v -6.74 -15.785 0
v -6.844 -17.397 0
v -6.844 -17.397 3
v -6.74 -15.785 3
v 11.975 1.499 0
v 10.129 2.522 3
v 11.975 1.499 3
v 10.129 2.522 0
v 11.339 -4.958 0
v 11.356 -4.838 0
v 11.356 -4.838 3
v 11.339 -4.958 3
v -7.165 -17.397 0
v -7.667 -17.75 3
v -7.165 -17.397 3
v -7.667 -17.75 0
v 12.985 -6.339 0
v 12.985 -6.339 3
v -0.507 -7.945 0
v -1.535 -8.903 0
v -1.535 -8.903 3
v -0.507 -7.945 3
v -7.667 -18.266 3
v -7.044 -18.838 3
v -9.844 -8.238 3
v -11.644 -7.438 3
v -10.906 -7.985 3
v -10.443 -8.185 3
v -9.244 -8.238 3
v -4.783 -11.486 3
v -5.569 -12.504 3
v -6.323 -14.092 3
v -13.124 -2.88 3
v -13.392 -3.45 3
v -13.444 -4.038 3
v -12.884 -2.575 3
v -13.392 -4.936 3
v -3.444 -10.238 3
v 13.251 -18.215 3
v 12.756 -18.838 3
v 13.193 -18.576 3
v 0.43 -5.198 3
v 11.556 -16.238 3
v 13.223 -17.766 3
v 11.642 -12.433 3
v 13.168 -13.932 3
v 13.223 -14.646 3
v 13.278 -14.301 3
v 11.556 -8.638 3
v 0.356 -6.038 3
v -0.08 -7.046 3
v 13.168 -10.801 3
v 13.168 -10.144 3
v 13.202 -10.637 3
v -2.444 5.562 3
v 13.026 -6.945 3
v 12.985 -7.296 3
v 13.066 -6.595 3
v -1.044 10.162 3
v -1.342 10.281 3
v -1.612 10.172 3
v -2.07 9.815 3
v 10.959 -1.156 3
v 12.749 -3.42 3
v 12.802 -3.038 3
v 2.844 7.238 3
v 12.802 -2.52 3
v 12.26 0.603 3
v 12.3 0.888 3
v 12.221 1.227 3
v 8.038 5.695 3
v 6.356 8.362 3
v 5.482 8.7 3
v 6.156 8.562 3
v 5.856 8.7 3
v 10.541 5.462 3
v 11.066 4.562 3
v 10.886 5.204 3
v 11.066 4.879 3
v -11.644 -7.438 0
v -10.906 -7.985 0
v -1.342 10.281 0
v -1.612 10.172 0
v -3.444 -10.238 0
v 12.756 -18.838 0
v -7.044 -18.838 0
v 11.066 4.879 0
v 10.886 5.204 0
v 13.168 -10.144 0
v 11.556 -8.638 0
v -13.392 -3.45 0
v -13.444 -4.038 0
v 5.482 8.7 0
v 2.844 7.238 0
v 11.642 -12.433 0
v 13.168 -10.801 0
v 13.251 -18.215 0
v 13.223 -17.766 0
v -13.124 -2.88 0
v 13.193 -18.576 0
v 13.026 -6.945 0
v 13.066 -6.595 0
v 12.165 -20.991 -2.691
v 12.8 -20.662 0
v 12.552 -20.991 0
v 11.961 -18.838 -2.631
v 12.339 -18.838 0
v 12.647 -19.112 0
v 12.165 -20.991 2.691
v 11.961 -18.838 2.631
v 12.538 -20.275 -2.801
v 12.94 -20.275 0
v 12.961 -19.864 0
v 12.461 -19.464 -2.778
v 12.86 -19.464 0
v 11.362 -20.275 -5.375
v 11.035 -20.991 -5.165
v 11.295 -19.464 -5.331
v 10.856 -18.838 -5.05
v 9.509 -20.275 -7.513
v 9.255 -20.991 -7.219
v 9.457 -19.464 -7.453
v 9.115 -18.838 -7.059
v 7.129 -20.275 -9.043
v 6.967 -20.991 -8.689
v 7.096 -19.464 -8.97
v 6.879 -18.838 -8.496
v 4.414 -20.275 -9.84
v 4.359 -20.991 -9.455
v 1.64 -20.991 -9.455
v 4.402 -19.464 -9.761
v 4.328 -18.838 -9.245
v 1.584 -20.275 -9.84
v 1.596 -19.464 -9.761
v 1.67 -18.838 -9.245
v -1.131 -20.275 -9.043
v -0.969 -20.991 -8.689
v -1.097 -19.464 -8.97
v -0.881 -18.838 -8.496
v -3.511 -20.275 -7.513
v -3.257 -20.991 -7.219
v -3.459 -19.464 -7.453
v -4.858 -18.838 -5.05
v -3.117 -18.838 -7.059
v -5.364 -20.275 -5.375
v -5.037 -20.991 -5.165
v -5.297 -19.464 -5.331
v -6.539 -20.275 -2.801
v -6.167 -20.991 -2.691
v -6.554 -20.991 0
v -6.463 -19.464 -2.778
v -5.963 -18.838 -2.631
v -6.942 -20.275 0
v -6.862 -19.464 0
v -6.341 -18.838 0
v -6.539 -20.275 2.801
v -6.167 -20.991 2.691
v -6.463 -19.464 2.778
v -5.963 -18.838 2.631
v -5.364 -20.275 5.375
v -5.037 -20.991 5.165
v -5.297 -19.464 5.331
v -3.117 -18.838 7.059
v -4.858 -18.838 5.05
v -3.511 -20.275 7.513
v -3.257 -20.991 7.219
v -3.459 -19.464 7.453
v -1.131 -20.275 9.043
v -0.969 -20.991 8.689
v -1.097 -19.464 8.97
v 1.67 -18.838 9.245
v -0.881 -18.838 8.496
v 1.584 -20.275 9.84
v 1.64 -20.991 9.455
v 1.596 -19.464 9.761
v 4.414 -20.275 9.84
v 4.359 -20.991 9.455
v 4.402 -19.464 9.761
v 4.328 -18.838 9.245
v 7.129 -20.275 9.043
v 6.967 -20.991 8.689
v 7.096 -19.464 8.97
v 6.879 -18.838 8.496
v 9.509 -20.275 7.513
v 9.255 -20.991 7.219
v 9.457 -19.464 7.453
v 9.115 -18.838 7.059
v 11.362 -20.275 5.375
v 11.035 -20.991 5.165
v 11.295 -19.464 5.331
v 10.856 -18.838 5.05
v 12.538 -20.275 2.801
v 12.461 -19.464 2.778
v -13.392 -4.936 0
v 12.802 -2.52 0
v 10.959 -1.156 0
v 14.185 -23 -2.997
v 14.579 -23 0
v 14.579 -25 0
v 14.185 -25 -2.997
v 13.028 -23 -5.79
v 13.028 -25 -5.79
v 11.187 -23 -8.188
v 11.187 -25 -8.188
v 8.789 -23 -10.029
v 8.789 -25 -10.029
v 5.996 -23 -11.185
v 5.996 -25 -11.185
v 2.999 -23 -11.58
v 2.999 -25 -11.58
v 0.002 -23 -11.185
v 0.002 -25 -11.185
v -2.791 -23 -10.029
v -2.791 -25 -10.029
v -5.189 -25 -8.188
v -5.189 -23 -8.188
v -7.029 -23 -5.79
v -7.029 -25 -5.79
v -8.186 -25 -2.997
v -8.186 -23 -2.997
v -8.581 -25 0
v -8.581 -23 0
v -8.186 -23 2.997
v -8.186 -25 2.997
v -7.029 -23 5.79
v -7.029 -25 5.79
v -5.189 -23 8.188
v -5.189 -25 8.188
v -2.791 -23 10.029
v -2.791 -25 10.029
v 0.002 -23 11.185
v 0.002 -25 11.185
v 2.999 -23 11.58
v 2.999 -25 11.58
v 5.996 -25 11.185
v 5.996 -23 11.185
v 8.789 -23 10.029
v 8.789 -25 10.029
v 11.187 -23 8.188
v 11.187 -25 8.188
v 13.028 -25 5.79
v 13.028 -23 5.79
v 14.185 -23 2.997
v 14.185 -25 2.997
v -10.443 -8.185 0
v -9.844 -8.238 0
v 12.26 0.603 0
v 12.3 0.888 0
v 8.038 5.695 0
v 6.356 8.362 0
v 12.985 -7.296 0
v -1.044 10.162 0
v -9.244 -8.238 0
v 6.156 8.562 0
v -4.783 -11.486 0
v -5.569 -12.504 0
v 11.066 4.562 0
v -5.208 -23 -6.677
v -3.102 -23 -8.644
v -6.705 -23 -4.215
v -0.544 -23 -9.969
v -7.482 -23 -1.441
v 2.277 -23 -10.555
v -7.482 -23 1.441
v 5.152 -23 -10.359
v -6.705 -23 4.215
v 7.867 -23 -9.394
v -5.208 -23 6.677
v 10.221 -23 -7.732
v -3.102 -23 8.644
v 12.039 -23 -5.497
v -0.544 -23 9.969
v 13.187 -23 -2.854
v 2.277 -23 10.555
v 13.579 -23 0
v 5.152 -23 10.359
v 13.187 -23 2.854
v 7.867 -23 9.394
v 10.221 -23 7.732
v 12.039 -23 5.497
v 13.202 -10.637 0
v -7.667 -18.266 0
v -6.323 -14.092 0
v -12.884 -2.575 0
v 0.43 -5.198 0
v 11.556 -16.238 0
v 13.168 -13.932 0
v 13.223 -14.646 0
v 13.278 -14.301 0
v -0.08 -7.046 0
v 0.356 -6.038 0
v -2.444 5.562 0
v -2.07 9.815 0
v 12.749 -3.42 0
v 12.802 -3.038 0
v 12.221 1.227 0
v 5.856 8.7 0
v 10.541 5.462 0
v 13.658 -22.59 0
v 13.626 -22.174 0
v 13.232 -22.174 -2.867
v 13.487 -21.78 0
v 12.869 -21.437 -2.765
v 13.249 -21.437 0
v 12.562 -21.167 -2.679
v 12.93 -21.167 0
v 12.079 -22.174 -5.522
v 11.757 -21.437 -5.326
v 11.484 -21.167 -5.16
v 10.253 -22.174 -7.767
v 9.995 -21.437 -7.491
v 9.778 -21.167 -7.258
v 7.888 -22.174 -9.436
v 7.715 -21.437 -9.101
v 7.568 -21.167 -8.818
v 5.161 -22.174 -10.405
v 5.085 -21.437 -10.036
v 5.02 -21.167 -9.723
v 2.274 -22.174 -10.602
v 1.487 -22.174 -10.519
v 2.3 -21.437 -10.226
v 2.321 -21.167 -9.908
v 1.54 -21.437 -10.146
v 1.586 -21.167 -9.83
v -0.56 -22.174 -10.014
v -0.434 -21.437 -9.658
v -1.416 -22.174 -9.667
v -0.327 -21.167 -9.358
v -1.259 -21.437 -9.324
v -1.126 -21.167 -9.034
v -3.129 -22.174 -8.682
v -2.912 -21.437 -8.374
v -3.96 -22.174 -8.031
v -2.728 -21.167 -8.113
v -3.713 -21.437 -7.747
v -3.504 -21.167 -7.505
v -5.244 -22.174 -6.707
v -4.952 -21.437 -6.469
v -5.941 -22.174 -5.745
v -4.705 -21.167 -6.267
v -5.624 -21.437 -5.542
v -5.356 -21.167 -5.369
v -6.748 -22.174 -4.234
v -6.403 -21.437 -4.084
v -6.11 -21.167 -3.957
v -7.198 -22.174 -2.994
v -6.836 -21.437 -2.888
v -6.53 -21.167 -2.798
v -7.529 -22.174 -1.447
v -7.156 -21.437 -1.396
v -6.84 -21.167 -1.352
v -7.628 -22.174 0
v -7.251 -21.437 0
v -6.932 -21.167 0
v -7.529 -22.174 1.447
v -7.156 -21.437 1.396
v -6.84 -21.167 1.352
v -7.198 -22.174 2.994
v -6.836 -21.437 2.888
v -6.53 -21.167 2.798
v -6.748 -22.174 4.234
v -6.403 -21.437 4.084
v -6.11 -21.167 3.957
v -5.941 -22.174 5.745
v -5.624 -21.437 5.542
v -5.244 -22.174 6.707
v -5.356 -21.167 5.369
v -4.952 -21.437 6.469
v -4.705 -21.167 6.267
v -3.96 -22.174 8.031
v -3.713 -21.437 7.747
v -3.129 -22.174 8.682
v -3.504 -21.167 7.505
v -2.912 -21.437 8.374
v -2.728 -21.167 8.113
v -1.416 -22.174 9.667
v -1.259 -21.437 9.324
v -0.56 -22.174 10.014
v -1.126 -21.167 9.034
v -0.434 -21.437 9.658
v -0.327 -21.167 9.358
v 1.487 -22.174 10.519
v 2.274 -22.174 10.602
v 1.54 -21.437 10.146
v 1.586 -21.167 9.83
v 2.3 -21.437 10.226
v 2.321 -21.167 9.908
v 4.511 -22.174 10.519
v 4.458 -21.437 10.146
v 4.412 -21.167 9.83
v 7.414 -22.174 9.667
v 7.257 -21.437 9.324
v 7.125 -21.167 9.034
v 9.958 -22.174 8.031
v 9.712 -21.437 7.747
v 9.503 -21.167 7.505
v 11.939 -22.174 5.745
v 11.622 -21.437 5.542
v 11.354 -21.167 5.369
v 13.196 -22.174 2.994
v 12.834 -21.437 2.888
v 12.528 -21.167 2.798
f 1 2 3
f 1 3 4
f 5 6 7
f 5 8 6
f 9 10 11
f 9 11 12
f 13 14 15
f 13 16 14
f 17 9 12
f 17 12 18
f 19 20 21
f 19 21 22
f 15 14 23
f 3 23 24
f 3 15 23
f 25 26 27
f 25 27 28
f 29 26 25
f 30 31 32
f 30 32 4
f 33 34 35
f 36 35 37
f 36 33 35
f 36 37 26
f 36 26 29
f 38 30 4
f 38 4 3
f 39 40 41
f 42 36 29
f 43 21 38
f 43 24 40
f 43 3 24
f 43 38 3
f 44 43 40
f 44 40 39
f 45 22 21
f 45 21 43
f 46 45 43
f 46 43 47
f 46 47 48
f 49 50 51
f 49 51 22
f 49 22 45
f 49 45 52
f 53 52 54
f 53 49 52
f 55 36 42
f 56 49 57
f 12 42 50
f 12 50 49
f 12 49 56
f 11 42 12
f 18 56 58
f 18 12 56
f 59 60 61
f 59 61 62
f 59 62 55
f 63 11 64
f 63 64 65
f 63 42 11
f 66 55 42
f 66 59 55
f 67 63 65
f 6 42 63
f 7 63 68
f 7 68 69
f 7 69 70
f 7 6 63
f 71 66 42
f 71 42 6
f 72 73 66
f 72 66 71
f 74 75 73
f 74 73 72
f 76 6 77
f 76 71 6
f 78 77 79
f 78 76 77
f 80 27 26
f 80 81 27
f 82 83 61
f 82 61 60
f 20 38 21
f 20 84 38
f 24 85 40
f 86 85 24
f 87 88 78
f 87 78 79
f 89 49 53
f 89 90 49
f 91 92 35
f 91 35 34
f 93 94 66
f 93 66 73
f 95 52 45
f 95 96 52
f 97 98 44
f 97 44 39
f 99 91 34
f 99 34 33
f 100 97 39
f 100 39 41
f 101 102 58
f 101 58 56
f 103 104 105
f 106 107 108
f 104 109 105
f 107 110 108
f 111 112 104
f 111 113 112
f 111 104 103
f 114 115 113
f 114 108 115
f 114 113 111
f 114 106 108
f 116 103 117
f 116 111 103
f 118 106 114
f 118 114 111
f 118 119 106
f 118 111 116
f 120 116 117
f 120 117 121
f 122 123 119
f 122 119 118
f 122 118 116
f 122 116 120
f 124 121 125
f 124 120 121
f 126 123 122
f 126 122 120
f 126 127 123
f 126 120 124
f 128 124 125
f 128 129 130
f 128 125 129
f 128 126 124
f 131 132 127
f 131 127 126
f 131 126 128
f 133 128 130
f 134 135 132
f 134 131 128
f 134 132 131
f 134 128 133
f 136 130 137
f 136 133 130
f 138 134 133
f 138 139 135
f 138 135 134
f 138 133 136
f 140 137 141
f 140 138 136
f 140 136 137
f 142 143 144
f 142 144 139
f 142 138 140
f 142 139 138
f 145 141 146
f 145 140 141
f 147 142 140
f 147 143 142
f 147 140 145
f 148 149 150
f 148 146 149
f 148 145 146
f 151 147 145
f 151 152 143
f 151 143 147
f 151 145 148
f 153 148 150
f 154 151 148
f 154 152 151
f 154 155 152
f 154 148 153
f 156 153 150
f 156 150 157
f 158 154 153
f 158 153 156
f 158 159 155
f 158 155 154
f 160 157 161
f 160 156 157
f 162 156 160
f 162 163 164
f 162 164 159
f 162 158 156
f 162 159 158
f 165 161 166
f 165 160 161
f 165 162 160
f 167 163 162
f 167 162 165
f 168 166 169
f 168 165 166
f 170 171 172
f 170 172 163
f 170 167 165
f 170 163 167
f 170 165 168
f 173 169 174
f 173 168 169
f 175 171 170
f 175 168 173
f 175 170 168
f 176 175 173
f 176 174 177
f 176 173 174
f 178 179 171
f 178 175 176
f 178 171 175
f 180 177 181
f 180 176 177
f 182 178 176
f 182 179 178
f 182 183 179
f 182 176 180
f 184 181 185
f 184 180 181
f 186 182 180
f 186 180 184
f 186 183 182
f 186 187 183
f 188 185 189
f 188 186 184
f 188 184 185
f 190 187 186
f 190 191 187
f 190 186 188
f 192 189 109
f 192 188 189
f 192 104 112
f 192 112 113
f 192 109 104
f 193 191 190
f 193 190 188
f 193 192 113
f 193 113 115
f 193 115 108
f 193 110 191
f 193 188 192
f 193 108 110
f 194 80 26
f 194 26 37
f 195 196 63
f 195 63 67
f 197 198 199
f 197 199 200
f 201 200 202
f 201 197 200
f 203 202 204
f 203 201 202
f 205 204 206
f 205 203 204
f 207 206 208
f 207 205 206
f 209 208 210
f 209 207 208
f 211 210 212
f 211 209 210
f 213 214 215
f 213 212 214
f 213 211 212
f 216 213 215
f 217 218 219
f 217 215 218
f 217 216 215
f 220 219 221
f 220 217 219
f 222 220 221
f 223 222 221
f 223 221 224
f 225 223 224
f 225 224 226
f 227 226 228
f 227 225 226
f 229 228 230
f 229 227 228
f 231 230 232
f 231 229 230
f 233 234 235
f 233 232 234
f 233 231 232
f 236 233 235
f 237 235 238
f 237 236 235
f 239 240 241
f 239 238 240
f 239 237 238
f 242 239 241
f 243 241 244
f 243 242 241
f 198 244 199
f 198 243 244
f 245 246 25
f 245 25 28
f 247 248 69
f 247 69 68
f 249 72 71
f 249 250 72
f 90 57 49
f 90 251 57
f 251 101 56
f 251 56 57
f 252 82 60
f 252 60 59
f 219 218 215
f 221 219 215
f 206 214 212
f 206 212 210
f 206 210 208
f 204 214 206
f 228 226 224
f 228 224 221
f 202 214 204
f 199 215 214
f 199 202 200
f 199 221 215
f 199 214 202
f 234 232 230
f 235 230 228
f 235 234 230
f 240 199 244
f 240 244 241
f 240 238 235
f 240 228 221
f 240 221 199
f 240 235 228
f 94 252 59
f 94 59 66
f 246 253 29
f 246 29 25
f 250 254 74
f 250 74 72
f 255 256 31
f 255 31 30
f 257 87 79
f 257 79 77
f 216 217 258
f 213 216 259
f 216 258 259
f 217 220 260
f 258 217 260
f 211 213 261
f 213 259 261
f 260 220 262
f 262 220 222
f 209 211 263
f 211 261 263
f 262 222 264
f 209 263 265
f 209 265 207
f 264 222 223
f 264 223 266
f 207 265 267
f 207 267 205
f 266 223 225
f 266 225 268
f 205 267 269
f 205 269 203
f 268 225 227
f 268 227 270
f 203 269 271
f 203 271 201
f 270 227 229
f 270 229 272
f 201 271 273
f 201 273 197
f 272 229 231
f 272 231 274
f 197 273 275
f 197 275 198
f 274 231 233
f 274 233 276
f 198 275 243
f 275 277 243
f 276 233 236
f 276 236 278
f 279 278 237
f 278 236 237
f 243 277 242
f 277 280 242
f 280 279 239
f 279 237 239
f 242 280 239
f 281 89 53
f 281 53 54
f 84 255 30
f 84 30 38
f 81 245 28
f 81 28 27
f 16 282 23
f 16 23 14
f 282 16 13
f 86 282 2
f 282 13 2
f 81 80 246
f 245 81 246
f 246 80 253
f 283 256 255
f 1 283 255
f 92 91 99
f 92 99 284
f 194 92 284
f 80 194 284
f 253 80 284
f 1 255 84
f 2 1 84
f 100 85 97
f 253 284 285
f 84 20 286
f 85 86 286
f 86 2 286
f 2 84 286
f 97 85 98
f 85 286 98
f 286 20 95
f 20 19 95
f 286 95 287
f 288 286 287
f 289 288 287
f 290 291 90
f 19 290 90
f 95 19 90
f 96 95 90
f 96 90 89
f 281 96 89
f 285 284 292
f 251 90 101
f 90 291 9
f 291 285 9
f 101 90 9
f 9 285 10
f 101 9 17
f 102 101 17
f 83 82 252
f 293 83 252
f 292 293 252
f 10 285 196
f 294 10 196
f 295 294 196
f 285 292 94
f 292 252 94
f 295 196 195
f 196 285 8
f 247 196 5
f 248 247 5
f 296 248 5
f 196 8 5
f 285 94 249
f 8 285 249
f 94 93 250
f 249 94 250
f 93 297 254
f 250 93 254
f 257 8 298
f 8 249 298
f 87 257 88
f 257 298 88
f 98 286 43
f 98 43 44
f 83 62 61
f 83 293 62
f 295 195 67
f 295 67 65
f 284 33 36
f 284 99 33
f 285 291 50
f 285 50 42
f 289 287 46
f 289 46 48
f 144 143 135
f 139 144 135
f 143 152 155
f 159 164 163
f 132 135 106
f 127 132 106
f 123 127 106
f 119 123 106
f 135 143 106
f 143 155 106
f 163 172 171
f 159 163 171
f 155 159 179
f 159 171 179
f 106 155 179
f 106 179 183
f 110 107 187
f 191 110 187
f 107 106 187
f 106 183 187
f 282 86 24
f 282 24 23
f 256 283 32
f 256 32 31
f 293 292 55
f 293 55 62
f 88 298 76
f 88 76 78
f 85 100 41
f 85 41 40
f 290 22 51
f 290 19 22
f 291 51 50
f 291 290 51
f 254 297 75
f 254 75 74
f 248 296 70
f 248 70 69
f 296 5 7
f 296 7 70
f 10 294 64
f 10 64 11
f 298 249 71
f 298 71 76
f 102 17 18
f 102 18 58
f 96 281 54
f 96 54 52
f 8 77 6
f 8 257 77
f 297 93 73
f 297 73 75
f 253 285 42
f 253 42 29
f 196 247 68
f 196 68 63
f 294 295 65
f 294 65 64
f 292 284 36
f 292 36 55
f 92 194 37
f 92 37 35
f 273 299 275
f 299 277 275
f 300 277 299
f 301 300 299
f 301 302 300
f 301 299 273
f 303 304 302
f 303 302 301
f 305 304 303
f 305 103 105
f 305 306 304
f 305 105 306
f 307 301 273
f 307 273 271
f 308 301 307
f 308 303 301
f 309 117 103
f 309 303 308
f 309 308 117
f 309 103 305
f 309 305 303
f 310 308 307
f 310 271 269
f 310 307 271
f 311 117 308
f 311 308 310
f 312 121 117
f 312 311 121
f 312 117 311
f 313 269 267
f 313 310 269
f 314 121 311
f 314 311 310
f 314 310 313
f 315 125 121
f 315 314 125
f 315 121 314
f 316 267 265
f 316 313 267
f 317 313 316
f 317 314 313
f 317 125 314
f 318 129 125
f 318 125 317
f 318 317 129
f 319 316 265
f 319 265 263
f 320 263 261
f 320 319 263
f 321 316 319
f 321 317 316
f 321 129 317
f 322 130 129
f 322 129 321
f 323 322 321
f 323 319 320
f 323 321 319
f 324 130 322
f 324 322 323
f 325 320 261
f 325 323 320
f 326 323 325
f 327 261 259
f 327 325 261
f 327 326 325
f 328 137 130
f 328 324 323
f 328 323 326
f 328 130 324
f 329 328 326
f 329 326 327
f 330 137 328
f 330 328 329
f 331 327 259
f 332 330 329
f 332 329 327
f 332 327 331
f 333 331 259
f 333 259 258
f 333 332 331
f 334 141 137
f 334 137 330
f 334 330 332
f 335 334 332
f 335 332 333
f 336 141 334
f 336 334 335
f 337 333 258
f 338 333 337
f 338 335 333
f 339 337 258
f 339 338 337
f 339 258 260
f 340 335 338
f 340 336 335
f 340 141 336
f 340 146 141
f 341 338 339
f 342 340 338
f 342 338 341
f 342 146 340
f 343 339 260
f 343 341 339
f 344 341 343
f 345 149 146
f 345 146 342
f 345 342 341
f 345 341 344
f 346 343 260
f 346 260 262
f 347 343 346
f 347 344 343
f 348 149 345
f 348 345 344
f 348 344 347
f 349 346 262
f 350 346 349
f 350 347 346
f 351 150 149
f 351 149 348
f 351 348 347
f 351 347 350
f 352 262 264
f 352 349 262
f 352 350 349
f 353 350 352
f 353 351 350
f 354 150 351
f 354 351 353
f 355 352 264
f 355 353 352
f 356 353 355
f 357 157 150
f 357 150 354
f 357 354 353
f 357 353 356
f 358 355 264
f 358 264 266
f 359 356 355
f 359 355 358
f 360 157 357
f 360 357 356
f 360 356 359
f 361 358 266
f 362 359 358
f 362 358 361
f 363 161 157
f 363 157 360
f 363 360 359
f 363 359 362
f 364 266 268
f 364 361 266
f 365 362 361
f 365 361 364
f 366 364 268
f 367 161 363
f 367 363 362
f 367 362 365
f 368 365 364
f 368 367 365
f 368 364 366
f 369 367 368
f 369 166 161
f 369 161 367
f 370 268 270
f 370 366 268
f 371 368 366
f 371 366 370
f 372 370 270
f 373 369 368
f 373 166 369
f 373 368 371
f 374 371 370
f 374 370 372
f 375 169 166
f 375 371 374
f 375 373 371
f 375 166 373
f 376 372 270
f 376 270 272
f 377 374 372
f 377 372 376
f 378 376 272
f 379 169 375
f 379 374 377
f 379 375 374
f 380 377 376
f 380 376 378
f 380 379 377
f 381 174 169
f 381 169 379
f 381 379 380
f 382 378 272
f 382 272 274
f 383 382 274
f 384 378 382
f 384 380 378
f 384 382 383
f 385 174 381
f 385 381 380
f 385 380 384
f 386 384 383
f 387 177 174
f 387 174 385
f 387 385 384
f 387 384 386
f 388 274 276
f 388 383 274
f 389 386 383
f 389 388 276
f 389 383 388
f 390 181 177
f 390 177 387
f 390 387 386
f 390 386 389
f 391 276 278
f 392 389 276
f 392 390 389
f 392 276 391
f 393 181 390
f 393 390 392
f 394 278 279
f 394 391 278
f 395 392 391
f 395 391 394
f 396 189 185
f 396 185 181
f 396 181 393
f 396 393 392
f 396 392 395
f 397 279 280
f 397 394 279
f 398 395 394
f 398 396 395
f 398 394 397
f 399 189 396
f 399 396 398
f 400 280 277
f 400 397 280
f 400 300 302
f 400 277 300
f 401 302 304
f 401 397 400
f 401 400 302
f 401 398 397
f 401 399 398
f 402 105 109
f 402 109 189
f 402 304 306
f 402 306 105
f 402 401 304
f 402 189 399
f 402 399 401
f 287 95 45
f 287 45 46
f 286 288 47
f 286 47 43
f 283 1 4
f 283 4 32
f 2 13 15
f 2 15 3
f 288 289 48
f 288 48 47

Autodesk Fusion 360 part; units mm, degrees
sketch "Sketch1" plane through (0, 0, 0) normal (0, 0, 1) x (1, 0, 0)
  line L0 (-1.0438, 10.1623) -> (2.8438, 7.2377)
  line L1 (2.8438, 7.2377) -> (5.4822, 8.7)
  line L2 (5.4822, 8.7) -> (5.8562, 8.7)
  line L3 (5.8562, 8.7) -> (6.1562, 8.5623)
  line L4 (6.1562, 8.5623) -> (6.3562, 8.3623)
  line L5 (6.3562, 8.3623) -> (8.0382, 5.6949)
  line L6 (8.0382, 5.6949) -> (10.541, 5.4625)
  line L7 (10.541, 5.4625) -> (10.8862, 5.2036)
  line L8 (10.8862, 5.2036) -> (11.0659, 4.8793)
  line L9 (11.0659, 4.8793) -> (11.0659, 4.5623)
  line L10 (11.0659, 4.5623) -> (10.1293, 2.5216)
  line L11 (10.1293, 2.5216) -> (11.9749, 1.4992)
  line L12 (11.9749, 1.4992) -> (12.2206, 1.227)
  line L13 (12.2206, 1.227) -> (12.3002, 0.8885)
  line L14 (12.3002, 0.8885) -> (12.2604, 0.603)
  line L15 (12.2604, 0.603) -> (10.9592, -1.1563)
  line L16 (10.9592, -1.1563) -> (12.8024, -2.5196)
  line L17 (12.8024, -2.5196) -> (12.8024, -3.0377)
  line L18 (12.8024, -3.0377) -> (12.7491, -3.4196)
  line L19 (12.7491, -3.4196) -> (11.3562, -4.8377)
  line L20 (11.3562, -4.8377) -> (11.3393, -4.9585)
  line L21 (11.3393, -4.9585) -> (12.9854, -6.3391)
  line L22 (12.9854, -6.3391) -> (13.0657, -6.5947)
  line L23 (13.0657, -6.5947) -> (13.0255, -6.9453)
  line L24 (13.0255, -6.9453) -> (12.9854, -7.2958)
  line L25 (12.9854, -7.2958) -> (11.5562, -8.6377)
  line L26 (11.5562, -8.6377) -> (13.1679, -10.1445)
  line L27 (13.1679, -10.1445) -> (13.2021, -10.6371)
  line L28 (13.2021, -10.6371) -> (13.1679, -10.8008)
  line L29 (13.1679, -10.8008) -> (11.6422, -12.4328)
  line L30 (11.6422, -12.4328) -> (13.1679, -13.9315)
  line L31 (13.1679, -13.9315) -> (13.2784, -14.301)
  line L32 (13.2784, -14.301) -> (13.2231, -14.6459)
  line L33 (13.2231, -14.6459) -> (11.5562, -16.2377)
  line L34 (11.5562, -16.2377) -> (13.2231, -17.7658)
  line L35 (13.2231, -17.7658) -> (13.2508, -18.2149)
  line L36 (13.2508, -18.2149) -> (13.1929, -18.576)
  line L37 (13.1929, -18.576) -> (12.7562, -18.8377)
  line L38 (12.7562, -18.8377) -> (-7.0438, -18.8377)
  line L39 (-7.0438, -18.8377) -> (-7.6673, -18.2662)
  line L40 (-7.6673, -18.2662) -> (-7.6673, -17.7497)
  line L41 (-7.6673, -17.7497) -> (-7.1652, -17.3969)
  line L42 (-7.1652, -17.3969) -> (-6.8438, -17.3969)
  line L43 (-6.8438, -17.3969) -> (-6.7402, -15.7848)
  line L44 (-6.7402, -15.7848) -> (-6.3231, -14.0925)
  line L45 (-6.3231, -14.0925) -> (-5.5692, -12.5045)
  line L46 (-5.5692, -12.5045) -> (-4.7832, -11.4859)
  line L47 (-4.7832, -11.4859) -> (-3.4438, -10.2377)
  line L48 (-3.4438, -10.2377) -> (-1.535, -8.9034)
  line L49 (-1.535, -8.9034) -> (-0.5068, -7.9451)
  line L50 (-0.5068, -7.9451) -> (-0.0799, -7.046)
  line L51 (-0.0799, -7.046) -> (0.3562, -6.0377)
  line L52 (0.3562, -6.0377) -> (0.4299, -5.1981)
  line L53 (0.4299, -5.1981) -> (-9.2438, -8.2377)
  line L54 (-9.2438, -8.2377) -> (-9.8438, -8.2377)
  line L55 (-9.8438, -8.2377) -> (-10.4427, -8.1851)
  line L56 (-10.4427, -8.1851) -> (-10.9056, -7.9849)
  line L57 (-10.9056, -7.9849) -> (-11.6438, -7.4377)
  line L58 (-11.6438, -7.4377) -> (-13.3922, -4.9365)
  line L59 (-13.3922, -4.9365) -> (-13.4438, -4.0377)
  line L60 (-13.4438, -4.0377) -> (-13.3922, -3.4502)
  line L61 (-13.3922, -3.4502) -> (-13.1243, -2.8802)
  line L62 (-13.1243, -2.8802) -> (-12.8837, -2.5754)
  line L63 (-12.8837, -2.5754) -> (-2.4438, 5.5623)
  line L64 (-2.4438, 5.5623) -> (-2.0701, 9.8149)
  line L65 (-2.0701, 9.8149) -> (-1.6122, 10.1719)
  line L66 (-1.6122, 10.1719) -> (-1.3425, 10.281)
  line L67 (-1.3425, 10.281) -> (-1.0438, 10.1623)
extrude "Extrude1" add sketch "Sketch1" along normal blind 3 makes body 1
sketch "Sketch2" plane through (0, 0, 3) normal (0, 0, 1) x (-1, 0, 0)
  line L0 (1.3425, -10.281) -> (1.6122, -10.1719)
  line L1 (1.6122, -10.1719) -> (2.0701, -9.8149)
  line L2 (2.0701, -9.8149) -> (2.4438, -5.5623)
  line L3 (2.4438, -5.5623) -> (12.8837, 2.5754)
  line L4 (12.8837, 2.5754) -> (13.1243, 2.8802)
  line L5 (13.1243, 2.8802) -> (13.3922, 3.4502)
  line L6 (13.3922, 3.4502) -> (13.4438, 4.0377)
  line L7 (13.4438, 4.0377) -> (13.3922, 4.9365)
  line L8 (13.3922, 4.9365) -> (11.6438, 7.4377)
  line L9 (11.6438, 7.4377) -> (10.9056, 7.9849)
  line L10 (10.9056, 7.9849) -> (10.4427, 8.1851)
  line L11 (10.4427, 8.1851) -> (9.8438, 8.2377)
  line L12 (9.8438, 8.2377) -> (9.2438, 8.2377)
  line L13 (9.2438, 8.2377) -> (-0.4299, 5.1981)
  line L14 (-0.4299, 5.1981) -> (-0.3562, 6.0377)
  line L15 (-0.3562, 6.0377) -> (0.0799, 7.046)
  line L16 (0.0799, 7.046) -> (0.5068, 7.9451)
  line L17 (0.5068, 7.9451) -> (1.535, 8.9034)
  line L18 (1.535, 8.9034) -> (3.4438, 10.2377)
  line L19 (3.4438, 10.2377) -> (4.7832, 11.4859)
  line L20 (4.7832, 11.4859) -> (5.5692, 12.5045)
  line L21 (5.5692, 12.5045) -> (6.3231, 14.0925)
  line L22 (6.3231, 14.0925) -> (6.7402, 15.7848)
  line L23 (6.7402, 15.7848) -> (6.8438, 17.3969)
  line L24 (6.8438, 17.3969) -> (7.1652, 17.3969)
  line L25 (7.1652, 17.3969) -> (7.6673, 17.7497)
  line L26 (7.6673, 17.7497) -> (7.6673, 18.2662)
  line L27 (7.6673, 18.2662) -> (7.0438, 18.8377)
  line L28 (7.0438, 18.8377) -> (-12.7562, 18.8377)
  line L29 (-12.7562, 18.8377) -> (-13.1929, 18.576)
  line L30 (-13.1929, 18.576) -> (-13.2508, 18.2149)
  line L31 (-13.2508, 18.2149) -> (-13.2231, 17.7658)
  line L32 (-13.2231, 17.7658) -> (-11.5562, 16.2377)
  line L33 (-11.5562, 16.2377) -> (-13.2231, 14.6459)
  line L34 (-13.2231, 14.6459) -> (-13.2784, 14.301)
  line L35 (-13.2784, 14.301) -> (-13.1679, 13.9315)
  line L36 (-13.1679, 13.9315) -> (-11.6422, 12.4328)
  line L37 (-11.6422, 12.4328) -> (-13.1679, 10.8008)
  line L38 (-13.1679, 10.8008) -> (-13.2021, 10.6371)
  line L39 (-13.2021, 10.6371) -> (-13.1679, 10.1445)
  line L40 (-13.1679, 10.1445) -> (-11.5562, 8.6377)
  line L41 (-11.5562, 8.6377) -> (-12.9854, 7.2958)
  line L42 (-12.9854, 7.2958) -> (-13.0657, 6.5947)
  line L43 (-13.0657, 6.5947) -> (-12.9854, 6.3391)
  line L44 (-12.9854, 6.3391) -> (-11.3393, 4.9585)
  line L45 (-11.3393, 4.9585) -> (-11.3562, 4.8377)
  line L46 (-11.3562, 4.8377) -> (-12.7491, 3.4196)
  line L47 (-12.7491, 3.4196) -> (-12.8024, 3.0377)
  line L48 (-12.8024, 3.0377) -> (-12.8024, 2.5196)
  line L49 (-12.8024, 2.5196) -> (-10.9592, 1.1563)
  line L50 (-10.9592, 1.1563) -> (-12.2604, -0.603)
  line L51 (-12.2604, -0.603) -> (-12.3002, -0.8885)
  line L52 (-12.3002, -0.8885) -> (-12.2206, -1.227)
  line L53 (-12.2206, -1.227) -> (-11.9749, -1.4992)
  line L54 (-11.9749, -1.4992) -> (-10.1293, -2.5216)
  line L55 (-10.1293, -2.5216) -> (-11.0659, -4.5623)
  line L56 (-11.0659, -4.5623) -> (-11.0659, -4.8793)
  line L57 (-11.0659, -4.8793) -> (-10.8862, -5.2036)
  line L58 (-10.8862, -5.2036) -> (-10.541, -5.4625)
  line L59 (-10.541, -5.4625) -> (-8.0382, -5.6949)
  line L60 (-8.0382, -5.6949) -> (-6.3562, -8.3623)
  line L61 (-6.3562, -8.3623) -> (-6.1562, -8.5623)
  line L62 (-6.1562, -8.5623) -> (-5.8562, -8.7)
  line L63 (-5.8562, -8.7) -> (-5.4822, -8.7)
  line L64 (-5.4822, -8.7) -> (-2.8438, -7.2377)
  line L65 (-2.8438, -7.2377) -> (1.0438, -10.1623)
  line L66 (1.0438, -10.1623) -> (1.3425, -10.281)
sketch "Sketch3" plane through (0, 0, 0) normal (0, 0, 1) x (1, 0, 0)
  line L0 (2.9991, -18.8378) -> (2.9991, -25)
  line L1 (2.9991, -25) -> (14.5791, -25)
  line L2 (14.5791, -25) -> (14.5791, -23)
  line L3 (14.5791, -23) -> (13.5791, -23)
  line L4 (2.9991, -18.8378) -> (12.3391, -18.8378)
  arc A0 (12.5518, -20.9911) -> (12.3391, -18.8378) centre (11.5791, -20) ccw
  arc A1 (13.5791, -23) -> (12.5518, -20.9911) centre (12.0791, -22.5) ccw
revolve "Revolve1" add sketch "Sketch3" angle 360 about axis through (2.9991, -18.8378, 0) along (0, -1, 0) separate body makes body 2
